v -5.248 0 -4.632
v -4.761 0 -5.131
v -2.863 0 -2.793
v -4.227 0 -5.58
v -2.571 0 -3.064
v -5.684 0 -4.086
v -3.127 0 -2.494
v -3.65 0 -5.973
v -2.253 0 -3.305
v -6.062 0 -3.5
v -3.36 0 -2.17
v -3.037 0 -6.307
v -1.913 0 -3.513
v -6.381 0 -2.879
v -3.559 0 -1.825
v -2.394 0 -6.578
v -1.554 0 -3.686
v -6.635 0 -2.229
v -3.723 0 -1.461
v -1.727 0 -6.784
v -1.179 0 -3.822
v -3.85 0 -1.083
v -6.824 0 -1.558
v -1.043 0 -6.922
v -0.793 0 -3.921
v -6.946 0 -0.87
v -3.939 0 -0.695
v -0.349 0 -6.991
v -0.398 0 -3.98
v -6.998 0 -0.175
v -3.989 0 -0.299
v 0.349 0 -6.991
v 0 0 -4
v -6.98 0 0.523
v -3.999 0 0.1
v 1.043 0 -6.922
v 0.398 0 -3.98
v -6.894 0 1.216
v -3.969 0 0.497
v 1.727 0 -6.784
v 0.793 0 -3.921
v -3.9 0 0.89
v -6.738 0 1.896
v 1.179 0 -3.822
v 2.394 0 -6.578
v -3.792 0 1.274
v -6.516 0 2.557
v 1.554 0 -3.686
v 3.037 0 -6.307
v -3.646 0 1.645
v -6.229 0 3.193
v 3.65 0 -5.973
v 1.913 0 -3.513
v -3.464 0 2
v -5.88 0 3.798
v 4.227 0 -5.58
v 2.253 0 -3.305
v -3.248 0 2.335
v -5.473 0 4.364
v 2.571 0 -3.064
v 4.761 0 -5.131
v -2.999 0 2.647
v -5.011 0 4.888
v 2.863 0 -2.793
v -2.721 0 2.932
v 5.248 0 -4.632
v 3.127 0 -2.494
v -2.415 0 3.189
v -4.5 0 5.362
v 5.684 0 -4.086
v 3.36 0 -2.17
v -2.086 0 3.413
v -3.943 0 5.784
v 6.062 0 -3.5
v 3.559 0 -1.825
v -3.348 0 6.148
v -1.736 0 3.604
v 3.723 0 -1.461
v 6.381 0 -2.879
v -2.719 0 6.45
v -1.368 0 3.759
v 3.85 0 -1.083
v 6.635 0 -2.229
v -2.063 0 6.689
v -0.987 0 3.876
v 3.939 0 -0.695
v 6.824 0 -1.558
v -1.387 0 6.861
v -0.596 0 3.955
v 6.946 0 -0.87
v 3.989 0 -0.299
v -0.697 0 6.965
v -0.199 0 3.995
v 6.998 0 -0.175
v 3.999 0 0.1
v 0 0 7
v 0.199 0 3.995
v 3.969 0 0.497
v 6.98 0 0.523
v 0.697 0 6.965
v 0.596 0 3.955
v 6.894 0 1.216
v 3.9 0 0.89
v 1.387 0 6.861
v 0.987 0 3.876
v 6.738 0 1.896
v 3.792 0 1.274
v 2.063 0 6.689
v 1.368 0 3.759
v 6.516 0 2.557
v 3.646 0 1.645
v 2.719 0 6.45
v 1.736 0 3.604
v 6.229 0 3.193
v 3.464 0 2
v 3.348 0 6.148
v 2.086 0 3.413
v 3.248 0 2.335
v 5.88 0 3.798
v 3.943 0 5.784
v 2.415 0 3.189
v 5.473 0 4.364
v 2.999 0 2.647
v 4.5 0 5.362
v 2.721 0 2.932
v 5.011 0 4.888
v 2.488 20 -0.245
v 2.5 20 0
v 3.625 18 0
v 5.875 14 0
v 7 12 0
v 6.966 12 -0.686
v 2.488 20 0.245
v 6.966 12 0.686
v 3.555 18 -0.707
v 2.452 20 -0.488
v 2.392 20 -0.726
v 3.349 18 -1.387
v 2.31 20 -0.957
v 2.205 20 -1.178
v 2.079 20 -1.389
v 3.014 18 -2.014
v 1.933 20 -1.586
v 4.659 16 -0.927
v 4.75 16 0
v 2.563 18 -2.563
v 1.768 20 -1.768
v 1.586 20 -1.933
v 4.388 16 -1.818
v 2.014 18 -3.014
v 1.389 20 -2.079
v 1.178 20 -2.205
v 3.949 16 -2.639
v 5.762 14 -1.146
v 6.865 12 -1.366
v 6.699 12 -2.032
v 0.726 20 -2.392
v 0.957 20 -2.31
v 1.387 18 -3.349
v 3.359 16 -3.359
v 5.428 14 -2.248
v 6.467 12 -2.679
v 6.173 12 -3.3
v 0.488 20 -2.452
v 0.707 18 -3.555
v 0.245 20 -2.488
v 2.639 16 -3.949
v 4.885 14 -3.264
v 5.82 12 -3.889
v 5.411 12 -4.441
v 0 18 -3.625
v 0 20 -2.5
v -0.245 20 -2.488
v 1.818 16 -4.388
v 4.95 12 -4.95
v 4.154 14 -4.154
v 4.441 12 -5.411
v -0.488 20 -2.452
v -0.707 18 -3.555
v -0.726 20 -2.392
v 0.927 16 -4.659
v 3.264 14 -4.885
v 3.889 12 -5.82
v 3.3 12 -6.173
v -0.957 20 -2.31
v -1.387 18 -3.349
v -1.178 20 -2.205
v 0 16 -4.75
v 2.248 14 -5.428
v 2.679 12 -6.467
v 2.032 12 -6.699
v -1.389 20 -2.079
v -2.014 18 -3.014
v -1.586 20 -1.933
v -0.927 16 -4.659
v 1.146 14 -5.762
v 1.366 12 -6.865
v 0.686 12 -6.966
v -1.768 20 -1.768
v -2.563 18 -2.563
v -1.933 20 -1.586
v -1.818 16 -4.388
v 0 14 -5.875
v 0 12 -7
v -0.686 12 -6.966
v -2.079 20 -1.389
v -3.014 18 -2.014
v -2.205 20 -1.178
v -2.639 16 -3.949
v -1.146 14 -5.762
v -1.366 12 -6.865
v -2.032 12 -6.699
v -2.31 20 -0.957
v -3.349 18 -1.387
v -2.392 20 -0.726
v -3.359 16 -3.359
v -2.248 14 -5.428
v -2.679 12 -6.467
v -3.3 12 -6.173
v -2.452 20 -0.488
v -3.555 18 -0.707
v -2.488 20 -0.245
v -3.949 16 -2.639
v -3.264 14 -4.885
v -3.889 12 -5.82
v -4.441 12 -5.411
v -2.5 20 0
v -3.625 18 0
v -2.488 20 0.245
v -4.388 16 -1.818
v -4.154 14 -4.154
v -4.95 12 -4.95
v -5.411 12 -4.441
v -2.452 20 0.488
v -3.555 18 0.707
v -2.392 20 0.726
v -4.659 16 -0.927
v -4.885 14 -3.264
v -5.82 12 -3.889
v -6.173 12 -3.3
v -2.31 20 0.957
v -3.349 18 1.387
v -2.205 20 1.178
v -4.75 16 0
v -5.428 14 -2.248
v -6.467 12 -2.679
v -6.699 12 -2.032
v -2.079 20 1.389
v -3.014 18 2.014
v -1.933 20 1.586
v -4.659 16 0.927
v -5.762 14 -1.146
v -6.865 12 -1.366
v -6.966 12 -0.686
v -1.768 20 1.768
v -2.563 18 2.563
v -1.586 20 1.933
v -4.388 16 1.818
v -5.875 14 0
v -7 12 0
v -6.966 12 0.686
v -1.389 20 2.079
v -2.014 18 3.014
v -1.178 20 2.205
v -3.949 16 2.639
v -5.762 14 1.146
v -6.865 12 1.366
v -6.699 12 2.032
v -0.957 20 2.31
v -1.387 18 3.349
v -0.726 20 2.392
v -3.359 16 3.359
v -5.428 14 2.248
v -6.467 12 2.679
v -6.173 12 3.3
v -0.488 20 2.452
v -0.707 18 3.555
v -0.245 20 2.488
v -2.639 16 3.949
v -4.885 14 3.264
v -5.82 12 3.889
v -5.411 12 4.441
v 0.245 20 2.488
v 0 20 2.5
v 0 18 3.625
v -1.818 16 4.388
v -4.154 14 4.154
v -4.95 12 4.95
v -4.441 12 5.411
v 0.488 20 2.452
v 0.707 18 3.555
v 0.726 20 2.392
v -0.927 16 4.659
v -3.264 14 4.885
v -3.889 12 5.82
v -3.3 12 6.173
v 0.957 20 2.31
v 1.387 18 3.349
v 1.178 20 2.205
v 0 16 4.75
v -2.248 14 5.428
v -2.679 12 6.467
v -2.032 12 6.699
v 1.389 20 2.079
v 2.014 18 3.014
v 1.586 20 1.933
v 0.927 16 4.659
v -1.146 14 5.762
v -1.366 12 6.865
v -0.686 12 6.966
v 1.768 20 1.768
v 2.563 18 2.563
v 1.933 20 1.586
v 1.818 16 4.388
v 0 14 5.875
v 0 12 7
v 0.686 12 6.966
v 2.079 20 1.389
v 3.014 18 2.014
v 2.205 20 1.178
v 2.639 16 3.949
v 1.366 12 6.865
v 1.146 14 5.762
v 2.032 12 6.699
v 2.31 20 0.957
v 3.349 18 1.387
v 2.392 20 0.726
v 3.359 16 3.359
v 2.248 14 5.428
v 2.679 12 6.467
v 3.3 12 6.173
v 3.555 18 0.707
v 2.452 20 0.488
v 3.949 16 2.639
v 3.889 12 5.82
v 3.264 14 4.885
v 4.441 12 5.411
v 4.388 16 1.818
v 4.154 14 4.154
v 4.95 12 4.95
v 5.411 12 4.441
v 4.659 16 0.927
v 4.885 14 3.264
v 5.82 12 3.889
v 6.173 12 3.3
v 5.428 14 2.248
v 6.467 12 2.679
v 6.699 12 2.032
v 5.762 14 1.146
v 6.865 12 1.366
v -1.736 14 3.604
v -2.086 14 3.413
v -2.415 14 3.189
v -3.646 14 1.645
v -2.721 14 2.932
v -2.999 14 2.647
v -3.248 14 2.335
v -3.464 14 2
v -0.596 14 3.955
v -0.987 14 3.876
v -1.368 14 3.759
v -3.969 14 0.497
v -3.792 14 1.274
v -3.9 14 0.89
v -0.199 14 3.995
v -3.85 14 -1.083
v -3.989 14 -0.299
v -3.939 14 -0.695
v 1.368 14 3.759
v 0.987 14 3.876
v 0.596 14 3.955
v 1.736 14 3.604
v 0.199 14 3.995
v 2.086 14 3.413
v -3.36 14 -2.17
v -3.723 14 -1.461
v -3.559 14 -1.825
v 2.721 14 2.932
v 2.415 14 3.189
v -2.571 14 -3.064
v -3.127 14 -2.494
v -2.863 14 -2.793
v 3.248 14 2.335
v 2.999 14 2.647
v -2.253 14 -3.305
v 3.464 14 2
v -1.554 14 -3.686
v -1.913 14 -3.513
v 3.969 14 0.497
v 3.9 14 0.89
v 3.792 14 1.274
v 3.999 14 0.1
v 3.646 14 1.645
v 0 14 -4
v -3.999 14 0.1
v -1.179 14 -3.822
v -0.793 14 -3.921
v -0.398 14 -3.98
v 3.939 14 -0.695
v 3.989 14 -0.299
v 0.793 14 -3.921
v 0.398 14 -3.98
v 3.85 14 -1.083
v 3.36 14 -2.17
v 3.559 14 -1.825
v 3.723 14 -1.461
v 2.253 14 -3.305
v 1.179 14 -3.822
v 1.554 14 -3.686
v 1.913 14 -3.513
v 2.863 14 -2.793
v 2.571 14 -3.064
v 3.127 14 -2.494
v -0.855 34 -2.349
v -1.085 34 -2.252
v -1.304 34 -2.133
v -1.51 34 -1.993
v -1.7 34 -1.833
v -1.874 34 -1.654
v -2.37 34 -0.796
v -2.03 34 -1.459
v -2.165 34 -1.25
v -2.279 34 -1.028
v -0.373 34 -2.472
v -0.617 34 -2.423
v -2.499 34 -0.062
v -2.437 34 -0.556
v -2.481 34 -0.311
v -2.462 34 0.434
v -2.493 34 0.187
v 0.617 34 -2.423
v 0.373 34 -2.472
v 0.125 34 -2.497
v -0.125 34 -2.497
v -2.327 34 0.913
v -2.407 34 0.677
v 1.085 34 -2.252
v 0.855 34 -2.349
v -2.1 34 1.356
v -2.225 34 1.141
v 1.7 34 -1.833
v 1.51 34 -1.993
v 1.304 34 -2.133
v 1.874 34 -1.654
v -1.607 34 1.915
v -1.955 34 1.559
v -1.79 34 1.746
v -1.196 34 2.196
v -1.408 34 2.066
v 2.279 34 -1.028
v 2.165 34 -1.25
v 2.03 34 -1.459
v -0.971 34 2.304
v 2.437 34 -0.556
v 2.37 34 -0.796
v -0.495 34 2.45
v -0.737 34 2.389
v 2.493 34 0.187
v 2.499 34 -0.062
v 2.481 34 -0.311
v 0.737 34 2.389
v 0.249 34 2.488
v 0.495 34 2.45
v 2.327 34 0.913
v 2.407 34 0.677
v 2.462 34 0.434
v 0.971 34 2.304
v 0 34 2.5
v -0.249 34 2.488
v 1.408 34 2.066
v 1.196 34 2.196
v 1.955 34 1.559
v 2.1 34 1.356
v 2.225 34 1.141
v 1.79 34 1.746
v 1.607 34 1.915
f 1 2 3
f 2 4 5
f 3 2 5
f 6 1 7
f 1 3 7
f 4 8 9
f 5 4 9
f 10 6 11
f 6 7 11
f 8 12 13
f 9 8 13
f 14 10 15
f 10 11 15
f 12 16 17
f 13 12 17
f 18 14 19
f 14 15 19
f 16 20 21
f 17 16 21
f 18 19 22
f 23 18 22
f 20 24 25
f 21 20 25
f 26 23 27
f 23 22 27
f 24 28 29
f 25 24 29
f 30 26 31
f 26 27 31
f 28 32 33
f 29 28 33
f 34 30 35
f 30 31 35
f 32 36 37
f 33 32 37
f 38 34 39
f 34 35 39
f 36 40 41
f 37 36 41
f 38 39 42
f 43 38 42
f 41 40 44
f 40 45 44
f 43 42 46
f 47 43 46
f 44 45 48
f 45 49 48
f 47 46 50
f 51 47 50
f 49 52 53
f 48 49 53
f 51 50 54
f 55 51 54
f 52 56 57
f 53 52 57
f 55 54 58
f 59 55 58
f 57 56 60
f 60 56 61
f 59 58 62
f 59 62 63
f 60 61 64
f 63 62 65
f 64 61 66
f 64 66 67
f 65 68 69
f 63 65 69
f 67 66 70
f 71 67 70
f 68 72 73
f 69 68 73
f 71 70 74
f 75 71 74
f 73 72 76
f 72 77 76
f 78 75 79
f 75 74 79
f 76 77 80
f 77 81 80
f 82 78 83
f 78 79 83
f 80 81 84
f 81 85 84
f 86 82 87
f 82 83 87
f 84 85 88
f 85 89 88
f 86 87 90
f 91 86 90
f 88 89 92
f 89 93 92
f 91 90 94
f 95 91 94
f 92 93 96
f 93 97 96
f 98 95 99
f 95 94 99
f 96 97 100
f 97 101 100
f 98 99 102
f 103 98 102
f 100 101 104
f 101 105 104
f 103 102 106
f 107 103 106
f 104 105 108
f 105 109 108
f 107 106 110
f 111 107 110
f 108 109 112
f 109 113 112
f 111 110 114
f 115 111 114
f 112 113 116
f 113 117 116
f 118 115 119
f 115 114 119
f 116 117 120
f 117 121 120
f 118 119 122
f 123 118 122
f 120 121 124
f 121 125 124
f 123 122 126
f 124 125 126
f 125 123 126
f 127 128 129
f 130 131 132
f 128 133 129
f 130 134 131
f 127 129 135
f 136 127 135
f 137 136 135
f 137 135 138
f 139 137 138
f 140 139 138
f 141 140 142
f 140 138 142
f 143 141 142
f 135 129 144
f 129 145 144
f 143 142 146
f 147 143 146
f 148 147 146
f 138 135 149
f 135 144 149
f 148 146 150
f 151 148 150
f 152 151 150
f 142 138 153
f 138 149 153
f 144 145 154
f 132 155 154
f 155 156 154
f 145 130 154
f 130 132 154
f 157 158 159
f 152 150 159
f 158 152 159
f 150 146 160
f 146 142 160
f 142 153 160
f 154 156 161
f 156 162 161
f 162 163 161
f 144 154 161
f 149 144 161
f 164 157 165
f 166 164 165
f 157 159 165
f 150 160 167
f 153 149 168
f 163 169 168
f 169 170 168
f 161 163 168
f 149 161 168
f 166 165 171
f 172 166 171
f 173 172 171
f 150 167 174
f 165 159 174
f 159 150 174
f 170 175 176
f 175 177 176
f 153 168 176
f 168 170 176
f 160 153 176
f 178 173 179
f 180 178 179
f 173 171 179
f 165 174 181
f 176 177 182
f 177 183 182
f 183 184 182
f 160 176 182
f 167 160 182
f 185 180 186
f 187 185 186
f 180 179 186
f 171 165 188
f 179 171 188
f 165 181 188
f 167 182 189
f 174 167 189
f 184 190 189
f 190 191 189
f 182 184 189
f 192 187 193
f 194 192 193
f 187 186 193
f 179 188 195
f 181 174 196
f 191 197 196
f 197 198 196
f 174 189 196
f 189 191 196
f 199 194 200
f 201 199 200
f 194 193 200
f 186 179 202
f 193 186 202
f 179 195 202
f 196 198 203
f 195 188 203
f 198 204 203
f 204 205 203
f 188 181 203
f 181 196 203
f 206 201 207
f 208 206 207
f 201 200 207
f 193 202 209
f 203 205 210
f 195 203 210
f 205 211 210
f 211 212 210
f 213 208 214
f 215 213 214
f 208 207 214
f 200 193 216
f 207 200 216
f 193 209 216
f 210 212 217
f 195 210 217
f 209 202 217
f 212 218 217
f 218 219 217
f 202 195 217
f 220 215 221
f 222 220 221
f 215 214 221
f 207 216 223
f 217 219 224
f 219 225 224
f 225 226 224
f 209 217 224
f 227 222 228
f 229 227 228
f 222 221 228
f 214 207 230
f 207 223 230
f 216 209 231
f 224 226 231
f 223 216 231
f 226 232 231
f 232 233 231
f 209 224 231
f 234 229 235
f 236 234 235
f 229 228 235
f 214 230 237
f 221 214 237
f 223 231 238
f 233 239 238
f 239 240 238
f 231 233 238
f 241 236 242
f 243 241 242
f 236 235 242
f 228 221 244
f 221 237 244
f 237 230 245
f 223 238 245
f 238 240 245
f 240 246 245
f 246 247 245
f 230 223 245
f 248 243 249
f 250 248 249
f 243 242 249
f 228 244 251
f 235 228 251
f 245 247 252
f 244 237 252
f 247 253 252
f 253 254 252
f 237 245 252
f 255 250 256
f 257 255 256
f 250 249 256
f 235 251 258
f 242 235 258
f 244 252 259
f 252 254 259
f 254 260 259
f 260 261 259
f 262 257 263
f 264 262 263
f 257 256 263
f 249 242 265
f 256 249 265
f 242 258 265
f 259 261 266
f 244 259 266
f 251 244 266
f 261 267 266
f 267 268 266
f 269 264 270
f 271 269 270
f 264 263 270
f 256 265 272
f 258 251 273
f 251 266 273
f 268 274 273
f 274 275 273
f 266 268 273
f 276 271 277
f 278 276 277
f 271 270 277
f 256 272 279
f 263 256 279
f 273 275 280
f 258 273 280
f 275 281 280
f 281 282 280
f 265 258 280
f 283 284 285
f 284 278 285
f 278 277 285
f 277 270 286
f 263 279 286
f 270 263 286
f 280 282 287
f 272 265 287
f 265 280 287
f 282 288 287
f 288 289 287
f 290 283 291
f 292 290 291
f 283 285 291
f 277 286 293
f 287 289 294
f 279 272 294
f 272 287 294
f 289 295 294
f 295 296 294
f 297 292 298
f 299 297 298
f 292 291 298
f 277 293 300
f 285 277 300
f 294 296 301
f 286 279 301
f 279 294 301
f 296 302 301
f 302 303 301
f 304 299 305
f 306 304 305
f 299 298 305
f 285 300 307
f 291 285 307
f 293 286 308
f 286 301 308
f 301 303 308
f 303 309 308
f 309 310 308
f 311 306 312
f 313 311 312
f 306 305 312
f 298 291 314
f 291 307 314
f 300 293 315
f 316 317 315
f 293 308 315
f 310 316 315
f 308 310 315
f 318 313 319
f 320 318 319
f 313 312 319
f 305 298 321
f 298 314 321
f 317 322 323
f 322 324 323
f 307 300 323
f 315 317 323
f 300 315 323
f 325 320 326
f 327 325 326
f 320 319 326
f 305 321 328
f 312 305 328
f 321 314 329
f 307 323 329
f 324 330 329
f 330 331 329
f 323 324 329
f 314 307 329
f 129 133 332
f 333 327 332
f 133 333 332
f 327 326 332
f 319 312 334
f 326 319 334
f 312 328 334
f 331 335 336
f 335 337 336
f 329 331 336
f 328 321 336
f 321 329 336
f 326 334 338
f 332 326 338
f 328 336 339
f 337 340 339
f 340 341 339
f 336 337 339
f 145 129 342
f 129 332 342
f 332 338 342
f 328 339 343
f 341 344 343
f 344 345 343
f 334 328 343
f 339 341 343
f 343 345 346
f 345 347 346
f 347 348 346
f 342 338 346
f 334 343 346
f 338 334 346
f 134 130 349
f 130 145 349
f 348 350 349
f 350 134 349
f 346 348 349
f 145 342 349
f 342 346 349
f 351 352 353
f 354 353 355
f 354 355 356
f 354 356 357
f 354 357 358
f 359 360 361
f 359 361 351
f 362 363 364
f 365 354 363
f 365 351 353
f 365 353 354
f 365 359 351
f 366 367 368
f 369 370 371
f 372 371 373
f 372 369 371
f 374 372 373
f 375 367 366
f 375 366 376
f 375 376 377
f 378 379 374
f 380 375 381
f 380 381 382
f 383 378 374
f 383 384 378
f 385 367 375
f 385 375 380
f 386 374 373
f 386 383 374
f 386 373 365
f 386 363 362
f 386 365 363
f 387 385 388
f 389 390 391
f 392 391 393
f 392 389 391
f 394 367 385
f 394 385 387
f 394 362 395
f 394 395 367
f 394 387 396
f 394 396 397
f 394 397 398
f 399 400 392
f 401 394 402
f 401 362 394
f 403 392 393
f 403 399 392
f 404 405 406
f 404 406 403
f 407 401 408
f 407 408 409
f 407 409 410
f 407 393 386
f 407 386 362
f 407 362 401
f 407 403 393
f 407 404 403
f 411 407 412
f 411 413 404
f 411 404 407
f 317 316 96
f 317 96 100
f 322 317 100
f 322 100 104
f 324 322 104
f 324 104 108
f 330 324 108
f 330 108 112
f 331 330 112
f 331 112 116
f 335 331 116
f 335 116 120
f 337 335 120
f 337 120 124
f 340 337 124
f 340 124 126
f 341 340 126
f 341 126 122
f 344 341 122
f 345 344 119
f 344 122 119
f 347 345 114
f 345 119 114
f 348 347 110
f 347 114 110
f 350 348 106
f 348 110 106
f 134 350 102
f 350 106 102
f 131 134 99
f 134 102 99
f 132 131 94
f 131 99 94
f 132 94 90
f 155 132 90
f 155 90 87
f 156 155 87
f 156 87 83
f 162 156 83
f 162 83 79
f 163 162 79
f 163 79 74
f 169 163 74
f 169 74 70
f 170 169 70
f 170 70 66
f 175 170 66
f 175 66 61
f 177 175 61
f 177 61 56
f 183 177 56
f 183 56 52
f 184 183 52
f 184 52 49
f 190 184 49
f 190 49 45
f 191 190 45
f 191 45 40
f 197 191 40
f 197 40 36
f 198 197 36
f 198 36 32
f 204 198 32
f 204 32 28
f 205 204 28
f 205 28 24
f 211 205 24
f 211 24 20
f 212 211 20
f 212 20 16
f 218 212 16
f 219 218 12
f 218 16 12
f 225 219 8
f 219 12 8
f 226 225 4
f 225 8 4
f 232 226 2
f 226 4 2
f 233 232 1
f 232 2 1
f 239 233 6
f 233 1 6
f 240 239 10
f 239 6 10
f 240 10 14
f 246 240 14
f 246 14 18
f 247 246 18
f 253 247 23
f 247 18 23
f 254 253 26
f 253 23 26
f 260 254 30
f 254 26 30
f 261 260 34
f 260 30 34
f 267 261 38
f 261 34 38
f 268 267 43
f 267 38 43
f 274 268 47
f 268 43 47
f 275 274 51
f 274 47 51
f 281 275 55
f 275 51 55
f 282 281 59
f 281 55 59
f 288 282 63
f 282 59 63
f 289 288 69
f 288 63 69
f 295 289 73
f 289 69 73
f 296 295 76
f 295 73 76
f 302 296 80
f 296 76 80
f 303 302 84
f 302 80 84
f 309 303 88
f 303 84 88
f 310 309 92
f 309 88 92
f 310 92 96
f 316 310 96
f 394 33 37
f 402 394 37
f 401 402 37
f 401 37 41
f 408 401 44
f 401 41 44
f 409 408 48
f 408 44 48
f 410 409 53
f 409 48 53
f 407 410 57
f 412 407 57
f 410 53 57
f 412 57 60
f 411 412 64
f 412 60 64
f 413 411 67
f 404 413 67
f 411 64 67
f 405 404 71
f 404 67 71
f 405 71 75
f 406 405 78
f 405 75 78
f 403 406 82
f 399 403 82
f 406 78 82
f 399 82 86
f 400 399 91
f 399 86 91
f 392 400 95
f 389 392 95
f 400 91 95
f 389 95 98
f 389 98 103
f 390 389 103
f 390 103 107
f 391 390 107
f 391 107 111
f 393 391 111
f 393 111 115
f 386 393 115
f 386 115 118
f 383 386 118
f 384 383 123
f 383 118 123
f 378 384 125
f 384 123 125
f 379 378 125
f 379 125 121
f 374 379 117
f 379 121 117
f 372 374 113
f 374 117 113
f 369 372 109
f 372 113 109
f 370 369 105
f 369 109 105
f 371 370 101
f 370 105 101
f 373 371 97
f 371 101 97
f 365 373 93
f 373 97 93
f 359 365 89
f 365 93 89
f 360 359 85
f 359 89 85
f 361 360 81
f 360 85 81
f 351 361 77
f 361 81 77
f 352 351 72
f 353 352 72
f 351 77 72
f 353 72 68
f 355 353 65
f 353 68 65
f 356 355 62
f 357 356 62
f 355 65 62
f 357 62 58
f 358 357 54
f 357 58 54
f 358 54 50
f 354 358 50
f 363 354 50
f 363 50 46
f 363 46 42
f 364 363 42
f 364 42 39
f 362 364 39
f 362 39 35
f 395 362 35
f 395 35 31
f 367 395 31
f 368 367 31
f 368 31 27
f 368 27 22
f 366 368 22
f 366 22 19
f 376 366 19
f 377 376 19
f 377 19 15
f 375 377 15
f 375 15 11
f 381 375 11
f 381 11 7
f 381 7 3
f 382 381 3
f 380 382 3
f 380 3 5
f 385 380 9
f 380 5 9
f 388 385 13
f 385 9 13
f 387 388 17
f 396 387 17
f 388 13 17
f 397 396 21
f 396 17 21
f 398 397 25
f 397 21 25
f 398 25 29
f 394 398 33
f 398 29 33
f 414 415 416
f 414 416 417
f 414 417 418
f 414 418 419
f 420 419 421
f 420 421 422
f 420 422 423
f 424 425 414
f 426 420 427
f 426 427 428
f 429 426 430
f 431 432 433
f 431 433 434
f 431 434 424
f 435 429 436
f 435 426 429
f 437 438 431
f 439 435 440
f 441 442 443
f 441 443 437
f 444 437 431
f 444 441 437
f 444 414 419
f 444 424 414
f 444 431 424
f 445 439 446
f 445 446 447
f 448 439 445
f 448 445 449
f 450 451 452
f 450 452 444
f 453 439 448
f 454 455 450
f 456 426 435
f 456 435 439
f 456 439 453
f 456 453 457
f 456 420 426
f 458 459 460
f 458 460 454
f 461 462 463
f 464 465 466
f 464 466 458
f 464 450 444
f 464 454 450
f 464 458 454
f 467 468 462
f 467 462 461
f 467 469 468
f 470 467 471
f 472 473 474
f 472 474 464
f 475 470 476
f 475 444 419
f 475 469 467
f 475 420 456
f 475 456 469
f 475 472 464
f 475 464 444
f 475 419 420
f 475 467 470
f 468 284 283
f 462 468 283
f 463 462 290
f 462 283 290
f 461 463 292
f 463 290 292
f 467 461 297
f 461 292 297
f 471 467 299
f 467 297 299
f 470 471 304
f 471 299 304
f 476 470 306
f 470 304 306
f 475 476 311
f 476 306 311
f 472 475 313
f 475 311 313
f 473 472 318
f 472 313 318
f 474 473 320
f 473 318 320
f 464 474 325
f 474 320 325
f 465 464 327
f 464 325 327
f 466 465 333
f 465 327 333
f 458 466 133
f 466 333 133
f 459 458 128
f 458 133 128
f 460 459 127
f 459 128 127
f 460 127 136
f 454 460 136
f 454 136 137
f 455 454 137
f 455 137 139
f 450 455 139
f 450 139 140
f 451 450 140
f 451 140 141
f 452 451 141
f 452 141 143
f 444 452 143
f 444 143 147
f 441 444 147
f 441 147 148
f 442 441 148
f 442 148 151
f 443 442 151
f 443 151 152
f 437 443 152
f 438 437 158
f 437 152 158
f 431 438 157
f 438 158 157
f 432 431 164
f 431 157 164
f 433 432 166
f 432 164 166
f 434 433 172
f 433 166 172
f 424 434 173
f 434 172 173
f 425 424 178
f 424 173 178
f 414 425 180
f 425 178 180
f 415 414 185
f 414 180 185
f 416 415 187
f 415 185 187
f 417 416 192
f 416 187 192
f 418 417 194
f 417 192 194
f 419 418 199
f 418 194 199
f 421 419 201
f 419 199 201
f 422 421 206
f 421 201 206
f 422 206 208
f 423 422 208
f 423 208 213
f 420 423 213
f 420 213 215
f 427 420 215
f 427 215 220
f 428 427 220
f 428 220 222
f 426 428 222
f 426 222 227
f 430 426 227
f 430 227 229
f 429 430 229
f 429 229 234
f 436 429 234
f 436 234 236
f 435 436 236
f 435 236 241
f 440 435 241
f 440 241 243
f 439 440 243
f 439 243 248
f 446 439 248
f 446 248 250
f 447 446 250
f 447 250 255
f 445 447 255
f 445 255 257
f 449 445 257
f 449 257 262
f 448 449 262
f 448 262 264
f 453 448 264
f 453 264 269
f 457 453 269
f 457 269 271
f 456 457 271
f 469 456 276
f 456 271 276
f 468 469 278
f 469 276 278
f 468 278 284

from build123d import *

# Parameters (mm, degrees)
SKETCH1_R           = 7
BOSS_EXTRUDE1_DEPTH = 12
SKETCH3_R           = 2.5
SKETCH4_R           = 7
SKETCH5_R           = 2.5
BOSS_EXTRUDE2_DEPTH = 14
SKETCH6_R           = 4
CUT_EXTRUDE1_DEPTH  = 14


with BuildPart() as part:
    # Sketch1 → Boss-Extrude1 (new body)
    with BuildSketch(Plane(origin=(0, 0, 0), x_dir=(1, 0, 0), z_dir=(0, 1, 0))):
        with Locations(Location((0, 0, 0), (0, 0, 270))):
            Circle(SKETCH1_R)
    extrude(amount=BOSS_EXTRUDE1_DEPTH)

    # Sketch3 → Loft1 section 0
    with BuildSketch(Plane(origin=(0, 20, 0), x_dir=(1, 0, 0), z_dir=(0, 1, 0))):
        Circle(SKETCH3_R)
    # Sketch4 → Loft1 section 1
    with BuildSketch(Plane(origin=(0, 12, 0), x_dir=(1, 0, 0), z_dir=(0, 1, 0))):
        Circle(SKETCH4_R)
    loft()

    # Sketch5 → Boss-Extrude2 (add)
    with BuildSketch(Plane(origin=(0, 20, 0), x_dir=(1, 0, 0), z_dir=(0, 1, 0))):
        with Locations(Location((0, 0, 0), (0, 0, 270))):
            Circle(SKETCH5_R)
    extrude(amount=BOSS_EXTRUDE2_DEPTH)

    # Sketch6 → Cut-Extrude1 (cut)
    with BuildSketch(Plane.XZ):
        with Locations(Location((0, 0, 0), (0, 0, 270))):
            Circle(SKETCH6_R)
    extrude(amount=-CUT_EXTRUDE1_DEPTH, mode=Mode.SUBTRACT)


solid = part.part
